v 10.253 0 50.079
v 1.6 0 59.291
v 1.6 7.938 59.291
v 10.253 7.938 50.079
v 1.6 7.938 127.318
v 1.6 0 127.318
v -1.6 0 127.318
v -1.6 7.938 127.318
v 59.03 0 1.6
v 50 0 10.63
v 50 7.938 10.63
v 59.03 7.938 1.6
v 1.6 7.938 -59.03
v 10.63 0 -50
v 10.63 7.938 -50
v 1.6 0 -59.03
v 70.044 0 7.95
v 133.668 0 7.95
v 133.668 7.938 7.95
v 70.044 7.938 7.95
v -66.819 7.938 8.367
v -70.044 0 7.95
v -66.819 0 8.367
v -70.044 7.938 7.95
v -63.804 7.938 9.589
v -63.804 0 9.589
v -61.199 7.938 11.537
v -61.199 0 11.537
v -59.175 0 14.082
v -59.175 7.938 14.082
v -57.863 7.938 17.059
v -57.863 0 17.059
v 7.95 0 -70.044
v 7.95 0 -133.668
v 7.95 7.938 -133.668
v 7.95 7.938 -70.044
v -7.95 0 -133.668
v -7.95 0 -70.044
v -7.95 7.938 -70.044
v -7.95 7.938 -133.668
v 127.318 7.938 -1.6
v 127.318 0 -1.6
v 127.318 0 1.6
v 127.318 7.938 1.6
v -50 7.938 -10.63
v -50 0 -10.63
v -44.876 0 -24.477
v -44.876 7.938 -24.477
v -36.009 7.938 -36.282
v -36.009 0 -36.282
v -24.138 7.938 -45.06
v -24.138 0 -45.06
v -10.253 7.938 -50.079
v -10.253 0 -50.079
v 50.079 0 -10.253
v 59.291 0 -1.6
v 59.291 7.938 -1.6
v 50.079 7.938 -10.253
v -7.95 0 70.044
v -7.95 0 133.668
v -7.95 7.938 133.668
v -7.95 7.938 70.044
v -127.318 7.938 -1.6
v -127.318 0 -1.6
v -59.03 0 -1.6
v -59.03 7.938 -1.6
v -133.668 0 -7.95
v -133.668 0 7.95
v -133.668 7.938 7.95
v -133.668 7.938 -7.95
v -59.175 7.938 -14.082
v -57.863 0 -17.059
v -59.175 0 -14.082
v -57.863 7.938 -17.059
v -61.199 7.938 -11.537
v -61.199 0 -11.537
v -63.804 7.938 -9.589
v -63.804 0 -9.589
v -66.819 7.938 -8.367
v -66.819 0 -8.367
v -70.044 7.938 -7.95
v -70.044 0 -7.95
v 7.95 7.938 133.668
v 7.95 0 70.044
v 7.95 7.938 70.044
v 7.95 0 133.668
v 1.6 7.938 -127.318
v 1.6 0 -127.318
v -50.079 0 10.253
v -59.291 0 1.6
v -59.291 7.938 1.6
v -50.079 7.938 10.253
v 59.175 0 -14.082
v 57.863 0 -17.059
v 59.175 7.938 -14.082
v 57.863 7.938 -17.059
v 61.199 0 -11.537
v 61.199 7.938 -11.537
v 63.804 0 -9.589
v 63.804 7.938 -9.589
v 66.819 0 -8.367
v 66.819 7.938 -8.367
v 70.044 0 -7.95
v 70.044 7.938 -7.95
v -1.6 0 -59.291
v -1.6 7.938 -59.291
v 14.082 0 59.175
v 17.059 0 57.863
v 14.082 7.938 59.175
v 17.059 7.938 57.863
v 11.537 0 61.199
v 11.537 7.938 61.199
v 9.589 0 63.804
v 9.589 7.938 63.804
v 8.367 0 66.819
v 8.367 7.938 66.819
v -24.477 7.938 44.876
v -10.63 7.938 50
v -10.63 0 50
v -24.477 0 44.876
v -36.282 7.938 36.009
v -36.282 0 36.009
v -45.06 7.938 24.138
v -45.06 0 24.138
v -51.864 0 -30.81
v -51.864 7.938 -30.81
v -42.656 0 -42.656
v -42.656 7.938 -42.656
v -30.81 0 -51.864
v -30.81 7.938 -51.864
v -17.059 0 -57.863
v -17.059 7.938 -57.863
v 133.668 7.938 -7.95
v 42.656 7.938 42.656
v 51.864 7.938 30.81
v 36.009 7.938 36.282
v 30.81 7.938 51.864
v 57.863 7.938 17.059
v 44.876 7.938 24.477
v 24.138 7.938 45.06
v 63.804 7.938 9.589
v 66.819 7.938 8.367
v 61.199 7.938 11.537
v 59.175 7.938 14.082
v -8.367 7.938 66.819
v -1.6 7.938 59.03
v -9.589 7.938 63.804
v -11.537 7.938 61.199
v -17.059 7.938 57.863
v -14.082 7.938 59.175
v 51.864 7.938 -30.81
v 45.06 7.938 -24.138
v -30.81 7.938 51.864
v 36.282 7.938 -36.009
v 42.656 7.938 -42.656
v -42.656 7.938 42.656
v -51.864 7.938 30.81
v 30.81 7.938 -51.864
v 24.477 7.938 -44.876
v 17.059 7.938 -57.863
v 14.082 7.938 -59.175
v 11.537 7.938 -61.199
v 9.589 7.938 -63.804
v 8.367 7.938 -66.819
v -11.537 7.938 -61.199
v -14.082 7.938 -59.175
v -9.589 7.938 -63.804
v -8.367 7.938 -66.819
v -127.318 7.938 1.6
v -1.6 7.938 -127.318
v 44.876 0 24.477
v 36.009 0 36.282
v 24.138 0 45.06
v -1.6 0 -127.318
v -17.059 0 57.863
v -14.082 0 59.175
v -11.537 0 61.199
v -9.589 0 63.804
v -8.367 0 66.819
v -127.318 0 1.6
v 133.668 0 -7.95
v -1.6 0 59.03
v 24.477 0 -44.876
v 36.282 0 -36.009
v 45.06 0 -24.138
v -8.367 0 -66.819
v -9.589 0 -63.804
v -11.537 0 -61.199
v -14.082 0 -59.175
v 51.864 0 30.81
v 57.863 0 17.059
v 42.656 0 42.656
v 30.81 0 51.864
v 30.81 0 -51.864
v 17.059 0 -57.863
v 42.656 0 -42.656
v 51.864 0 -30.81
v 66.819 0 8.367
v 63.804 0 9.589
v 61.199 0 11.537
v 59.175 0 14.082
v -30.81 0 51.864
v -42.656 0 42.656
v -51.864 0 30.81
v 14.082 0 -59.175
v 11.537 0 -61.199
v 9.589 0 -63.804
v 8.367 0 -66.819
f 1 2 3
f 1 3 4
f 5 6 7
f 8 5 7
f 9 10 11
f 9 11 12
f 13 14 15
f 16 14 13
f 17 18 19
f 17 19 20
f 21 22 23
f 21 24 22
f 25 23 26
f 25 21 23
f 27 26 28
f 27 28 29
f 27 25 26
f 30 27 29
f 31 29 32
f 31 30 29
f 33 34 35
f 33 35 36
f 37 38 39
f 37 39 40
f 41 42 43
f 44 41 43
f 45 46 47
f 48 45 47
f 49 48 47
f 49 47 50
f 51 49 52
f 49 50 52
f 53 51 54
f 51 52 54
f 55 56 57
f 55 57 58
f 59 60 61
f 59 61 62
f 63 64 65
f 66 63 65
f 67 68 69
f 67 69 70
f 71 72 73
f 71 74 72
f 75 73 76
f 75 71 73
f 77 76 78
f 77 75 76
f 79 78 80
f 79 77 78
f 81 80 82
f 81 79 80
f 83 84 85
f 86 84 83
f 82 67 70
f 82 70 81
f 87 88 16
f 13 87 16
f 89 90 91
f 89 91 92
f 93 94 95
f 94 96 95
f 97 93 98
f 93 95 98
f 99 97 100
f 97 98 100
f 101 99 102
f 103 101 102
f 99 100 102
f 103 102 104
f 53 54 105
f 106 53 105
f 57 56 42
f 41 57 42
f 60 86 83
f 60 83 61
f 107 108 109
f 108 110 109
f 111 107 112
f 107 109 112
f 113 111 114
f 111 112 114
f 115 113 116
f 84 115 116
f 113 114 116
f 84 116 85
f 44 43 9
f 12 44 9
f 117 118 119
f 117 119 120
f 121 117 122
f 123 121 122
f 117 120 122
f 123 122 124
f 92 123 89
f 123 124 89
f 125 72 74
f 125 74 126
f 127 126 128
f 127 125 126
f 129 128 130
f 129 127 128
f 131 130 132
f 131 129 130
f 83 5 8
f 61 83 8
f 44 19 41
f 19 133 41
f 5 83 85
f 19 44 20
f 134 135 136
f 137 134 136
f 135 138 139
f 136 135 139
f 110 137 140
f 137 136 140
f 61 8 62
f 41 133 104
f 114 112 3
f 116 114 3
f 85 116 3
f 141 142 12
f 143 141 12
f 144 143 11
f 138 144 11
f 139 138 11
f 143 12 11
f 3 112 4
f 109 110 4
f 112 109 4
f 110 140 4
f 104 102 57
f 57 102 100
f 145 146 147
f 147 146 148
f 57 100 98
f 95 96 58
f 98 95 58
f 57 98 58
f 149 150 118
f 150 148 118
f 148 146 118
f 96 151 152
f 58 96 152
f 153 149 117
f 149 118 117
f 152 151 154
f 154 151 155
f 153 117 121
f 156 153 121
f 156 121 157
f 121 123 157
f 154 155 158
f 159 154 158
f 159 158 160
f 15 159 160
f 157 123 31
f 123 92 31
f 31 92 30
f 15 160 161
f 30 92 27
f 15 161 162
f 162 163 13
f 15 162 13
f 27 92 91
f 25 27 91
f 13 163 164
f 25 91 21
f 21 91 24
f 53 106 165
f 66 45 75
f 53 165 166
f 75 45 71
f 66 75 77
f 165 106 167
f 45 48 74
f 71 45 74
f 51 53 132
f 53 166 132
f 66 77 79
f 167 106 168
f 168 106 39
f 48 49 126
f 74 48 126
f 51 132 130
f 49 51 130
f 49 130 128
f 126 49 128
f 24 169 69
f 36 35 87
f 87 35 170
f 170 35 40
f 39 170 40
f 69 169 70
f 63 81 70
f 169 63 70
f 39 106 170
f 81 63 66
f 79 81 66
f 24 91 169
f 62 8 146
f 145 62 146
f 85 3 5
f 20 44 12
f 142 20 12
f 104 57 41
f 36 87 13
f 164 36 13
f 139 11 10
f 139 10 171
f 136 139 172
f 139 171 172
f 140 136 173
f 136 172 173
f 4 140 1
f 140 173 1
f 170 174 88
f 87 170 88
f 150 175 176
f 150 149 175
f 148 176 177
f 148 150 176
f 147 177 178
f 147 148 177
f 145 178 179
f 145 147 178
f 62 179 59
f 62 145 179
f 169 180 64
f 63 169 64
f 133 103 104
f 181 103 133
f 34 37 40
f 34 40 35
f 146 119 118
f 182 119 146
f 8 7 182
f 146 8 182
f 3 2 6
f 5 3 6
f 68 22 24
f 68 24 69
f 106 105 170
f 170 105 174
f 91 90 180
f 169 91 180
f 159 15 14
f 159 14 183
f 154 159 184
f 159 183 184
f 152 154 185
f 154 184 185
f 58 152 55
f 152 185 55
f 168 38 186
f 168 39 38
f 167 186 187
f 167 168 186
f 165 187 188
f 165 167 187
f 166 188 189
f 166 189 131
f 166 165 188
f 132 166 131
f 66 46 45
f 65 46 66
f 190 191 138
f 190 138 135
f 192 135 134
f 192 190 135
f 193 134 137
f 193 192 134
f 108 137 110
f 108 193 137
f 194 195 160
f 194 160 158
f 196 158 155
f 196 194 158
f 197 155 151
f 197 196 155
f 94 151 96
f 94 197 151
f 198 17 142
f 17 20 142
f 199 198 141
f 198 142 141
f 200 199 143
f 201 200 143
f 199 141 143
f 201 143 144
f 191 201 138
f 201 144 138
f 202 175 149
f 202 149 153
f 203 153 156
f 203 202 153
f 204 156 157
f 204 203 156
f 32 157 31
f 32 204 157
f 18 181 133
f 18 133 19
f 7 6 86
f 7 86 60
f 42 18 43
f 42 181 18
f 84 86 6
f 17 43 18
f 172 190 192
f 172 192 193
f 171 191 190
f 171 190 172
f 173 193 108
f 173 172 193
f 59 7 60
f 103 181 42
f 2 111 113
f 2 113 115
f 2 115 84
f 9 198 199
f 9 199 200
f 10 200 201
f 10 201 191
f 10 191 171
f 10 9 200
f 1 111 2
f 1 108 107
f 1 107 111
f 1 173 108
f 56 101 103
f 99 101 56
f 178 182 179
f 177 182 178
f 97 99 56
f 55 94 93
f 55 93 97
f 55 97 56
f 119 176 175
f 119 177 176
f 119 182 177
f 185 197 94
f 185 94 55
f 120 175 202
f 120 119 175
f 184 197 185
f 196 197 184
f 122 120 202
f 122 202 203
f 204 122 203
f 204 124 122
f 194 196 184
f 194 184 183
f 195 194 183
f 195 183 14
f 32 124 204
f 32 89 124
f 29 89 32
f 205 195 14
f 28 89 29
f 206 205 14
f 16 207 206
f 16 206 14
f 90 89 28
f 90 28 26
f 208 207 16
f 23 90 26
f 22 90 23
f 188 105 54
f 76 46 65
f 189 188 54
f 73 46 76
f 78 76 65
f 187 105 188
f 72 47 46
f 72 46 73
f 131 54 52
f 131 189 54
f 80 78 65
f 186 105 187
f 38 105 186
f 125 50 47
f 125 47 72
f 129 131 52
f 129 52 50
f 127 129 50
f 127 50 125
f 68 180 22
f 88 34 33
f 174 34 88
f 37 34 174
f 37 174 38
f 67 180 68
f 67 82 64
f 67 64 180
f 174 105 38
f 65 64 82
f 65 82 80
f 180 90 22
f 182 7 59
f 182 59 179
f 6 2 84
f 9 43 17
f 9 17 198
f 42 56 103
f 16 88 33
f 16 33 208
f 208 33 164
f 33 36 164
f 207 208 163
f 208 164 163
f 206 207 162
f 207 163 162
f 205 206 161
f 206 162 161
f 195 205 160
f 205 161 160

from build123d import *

# Parameters (mm, degrees)
BOSS_EXTRUDE1_DEPTH = 7.9375
FILLET2_R           = 12.7
CHAMFER1_SIZE       = 8.198155848
CHAMFER1_SIZE_2     = 7.9375


with BuildPart() as part:
    # Sketch1 → Boss-Extrude1 (new body)
    with BuildSketch(Plane(origin=(0, 0, 0), x_dir=(1, 0, 0), z_dir=(0, 1, 0))):
        with BuildLine():
            Line((-7.9502, 133.6675), (7.9502, 133.6675))
            Line((7.9502, 133.6675), (7.9502, 59.79882896))
            ThreePointArc((7.9502, 59.79882896), (42.656216575, 42.656216575), (59.79882896, 7.9502))
            Line((59.79882896, 7.9502), (133.6675, 7.9502))
            Line((133.6675, 7.9502), (133.6675, -7.9502))
            Line((133.6675, -7.9502), (59.79882896, -7.9502))
            ThreePointArc((59.79882896, -7.9502), (42.656216575, -42.656216575), (7.9502, -59.79882896))
            Line((7.9502, -59.79882896), (7.9502, -133.6675))
            Line((7.9502, -133.6675), (-7.9502, -133.6675))
            Line((-7.9502, -133.6675), (-7.9502, -59.79882896))
            ThreePointArc((-7.9502, -59.79882896), (-42.656216575, -42.656216575), (-59.79882896, -7.9502))
            Line((-59.79882896, -7.9502), (-133.6675, -7.9502))
            Line((-133.6675, -7.9502), (-133.6675, 7.9502))
            Line((-133.6675, 7.9502), (-59.79882896, 7.9502))
            ThreePointArc((-59.79882896, 7.9502), (-42.656216575, 42.656216575), (-7.9502, 59.79882896))
            Line((-7.9502, 59.79882896), (-7.9502, 133.6675))
        make_face()
        with BuildLine():
            Line((-1.6002, 51.092447252), (-1.6002, 127.3175))
            Line((-1.6002, 127.3175), (1.6002, 127.3175))
            Line((1.6002, 127.3175), (1.6002, 51.092447252))
            ThreePointArc((1.6002, 51.092447252), (36.145530887, 36.145530887), (51.092447252, 1.6002))
            Line((51.092447252, 1.6002), (127.3175, 1.6002))
            Line((127.3175, 1.6002), (127.3175, -1.6002))
            Line((127.3175, -1.6002), (51.092447252, -1.6002))
            ThreePointArc((51.092447252, -1.6002), (36.145530887, -36.145530887), (1.6002, -51.092447252))
            Line((1.6002, -51.092447252), (1.6002, -127.3175))
            Line((1.6002, -127.3175), (-1.6002, -127.3175))
            Line((-1.6002, -127.3175), (-1.6002, -51.092447252))
            ThreePointArc((-1.6002, -51.092447252), (-36.145530887, -36.145530887), (-51.092447252, -1.6002))
            Line((-51.092447252, -1.6002), (-127.3175, -1.6002))
            Line((-127.3175, -1.6002), (-127.3175, 1.6002))
            Line((-127.3175, 1.6002), (-51.092447252, 1.6002))
            ThreePointArc((-51.092447252, 1.6002), (-36.145530887, 36.145530887), (-1.6002, 51.092447252))
        make_face(mode=Mode.SUBTRACT)
    extrude(amount=BOSS_EXTRUDE1_DEPTH)

    # Fillet2
    fillet2_edges = [part.edges().sort_by_distance(p)[0] for p in [
        (59.79882896, 3.96875, 7.9502),
        (7.9502, 3.96875, 59.79882896),
        (-7.9502, 3.96875, 59.79882896),
        (-59.79882896, 3.96875, 7.9502),
        (-59.79882896, 3.96875, -7.9502),
        (-7.9502, 3.96875, -59.79882896),
        (7.9502, 3.96875, -59.79882896),
        (59.79882896, 3.96875, -7.9502),
    ]]
    fillet(fillet2_edges, radius=FILLET2_R)

    # Chamfer1
    # the kernel refuses this chamfer: 8.198155848, 7.9375 mm, written as the material it takes off along each edge
    with BuildSketch(Plane(origin=(-1.6002, -22.411946767, -51.092447252), x_dir=(-0.9932071944131365, 0, 0.11635922381137723), z_dir=(0, 1, 0))) as chamfer1_piece_1:
        with BuildLine():
            Line((8.711494705, 0), (-CHAMFER1_SIZE * 0.116359223814, -CHAMFER1_SIZE * 0.993207194436))
            Line((-CHAMFER1_SIZE * 0.116359223814, -CHAMFER1_SIZE * 0.993207194436), (0, 0))
            ThreePointArc((0, 0), (4.4818633, -0.185760204), (8.711494705, 0))
        make_face()
    extrude(amount=52.761393535, mode=Mode.SUBTRACT)
    with BuildSketch(Plane(origin=(-51.092447252, -23.390114348, -1.6002), x_dir=(0.12010619986132272, 0, -0.9927610491728973), z_dir=(0, 1, 0)), Plane(origin=(-1.6002, -23.390114348, 51.092447252), x_dir=(-0.9927610491728978, 0, -0.12010619986131951), z_dir=(0, 1, 0)), Plane(origin=(51.092447252, -23.390114348, 1.6002), x_dir=(-0.12010619986131572, 0, 0.9927610491728983), z_dir=(0, 1, 0)), Plane(origin=(1.6002, -23.390114348, -51.092447252), x_dir=(0.9927610491728988, 0, 0.12010619986131156), z_dir=(0, 1, 0))) as chamfer1_piece_2:
        with BuildLine():
            Line((9.0958069, 0), (-CHAMFER1_SIZE_2 * 0.120106199861, CHAMFER1_SIZE_2 * 0.992761049173))
            Line((-CHAMFER1_SIZE_2 * 0.120106199861, CHAMFER1_SIZE_2 * 0.992761049173), (0, 0))
            ThreePointArc((0, 0), (4.677699861, 0.202549732), (9.0958069, 0))
        make_face()
    extrude(amount=54.717728697, mode=Mode.SUBTRACT)
    with BuildSketch(Plane(origin=(-51.092447252, -22.411946767, 1.6002), x_dir=(-1, 0, 0), z_dir=(0, 1, 0)), Plane(origin=(1.6002, -22.411946767, 51.092447252), x_dir=(0, 0, 1), z_dir=(0, 1, 0)), Plane(origin=(51.092447252, -22.411946767, -1.6002), x_dir=(1, 0, 0), z_dir=(0, 1, 0))) as chamfer1_piece_3:
        with BuildLine():
            Line((CHAMFER1_SIZE, 0), (-1.013662762, 8.652319215))
            ThreePointArc((-1.013662762, 8.652319215), (-0.337007764, 4.473033787), (0, 0))
            Line((0, 0), (CHAMFER1_SIZE, 0))
        make_face()
    extrude(amount=52.761393535, mode=Mode.SUBTRACT)


solid = part.part
